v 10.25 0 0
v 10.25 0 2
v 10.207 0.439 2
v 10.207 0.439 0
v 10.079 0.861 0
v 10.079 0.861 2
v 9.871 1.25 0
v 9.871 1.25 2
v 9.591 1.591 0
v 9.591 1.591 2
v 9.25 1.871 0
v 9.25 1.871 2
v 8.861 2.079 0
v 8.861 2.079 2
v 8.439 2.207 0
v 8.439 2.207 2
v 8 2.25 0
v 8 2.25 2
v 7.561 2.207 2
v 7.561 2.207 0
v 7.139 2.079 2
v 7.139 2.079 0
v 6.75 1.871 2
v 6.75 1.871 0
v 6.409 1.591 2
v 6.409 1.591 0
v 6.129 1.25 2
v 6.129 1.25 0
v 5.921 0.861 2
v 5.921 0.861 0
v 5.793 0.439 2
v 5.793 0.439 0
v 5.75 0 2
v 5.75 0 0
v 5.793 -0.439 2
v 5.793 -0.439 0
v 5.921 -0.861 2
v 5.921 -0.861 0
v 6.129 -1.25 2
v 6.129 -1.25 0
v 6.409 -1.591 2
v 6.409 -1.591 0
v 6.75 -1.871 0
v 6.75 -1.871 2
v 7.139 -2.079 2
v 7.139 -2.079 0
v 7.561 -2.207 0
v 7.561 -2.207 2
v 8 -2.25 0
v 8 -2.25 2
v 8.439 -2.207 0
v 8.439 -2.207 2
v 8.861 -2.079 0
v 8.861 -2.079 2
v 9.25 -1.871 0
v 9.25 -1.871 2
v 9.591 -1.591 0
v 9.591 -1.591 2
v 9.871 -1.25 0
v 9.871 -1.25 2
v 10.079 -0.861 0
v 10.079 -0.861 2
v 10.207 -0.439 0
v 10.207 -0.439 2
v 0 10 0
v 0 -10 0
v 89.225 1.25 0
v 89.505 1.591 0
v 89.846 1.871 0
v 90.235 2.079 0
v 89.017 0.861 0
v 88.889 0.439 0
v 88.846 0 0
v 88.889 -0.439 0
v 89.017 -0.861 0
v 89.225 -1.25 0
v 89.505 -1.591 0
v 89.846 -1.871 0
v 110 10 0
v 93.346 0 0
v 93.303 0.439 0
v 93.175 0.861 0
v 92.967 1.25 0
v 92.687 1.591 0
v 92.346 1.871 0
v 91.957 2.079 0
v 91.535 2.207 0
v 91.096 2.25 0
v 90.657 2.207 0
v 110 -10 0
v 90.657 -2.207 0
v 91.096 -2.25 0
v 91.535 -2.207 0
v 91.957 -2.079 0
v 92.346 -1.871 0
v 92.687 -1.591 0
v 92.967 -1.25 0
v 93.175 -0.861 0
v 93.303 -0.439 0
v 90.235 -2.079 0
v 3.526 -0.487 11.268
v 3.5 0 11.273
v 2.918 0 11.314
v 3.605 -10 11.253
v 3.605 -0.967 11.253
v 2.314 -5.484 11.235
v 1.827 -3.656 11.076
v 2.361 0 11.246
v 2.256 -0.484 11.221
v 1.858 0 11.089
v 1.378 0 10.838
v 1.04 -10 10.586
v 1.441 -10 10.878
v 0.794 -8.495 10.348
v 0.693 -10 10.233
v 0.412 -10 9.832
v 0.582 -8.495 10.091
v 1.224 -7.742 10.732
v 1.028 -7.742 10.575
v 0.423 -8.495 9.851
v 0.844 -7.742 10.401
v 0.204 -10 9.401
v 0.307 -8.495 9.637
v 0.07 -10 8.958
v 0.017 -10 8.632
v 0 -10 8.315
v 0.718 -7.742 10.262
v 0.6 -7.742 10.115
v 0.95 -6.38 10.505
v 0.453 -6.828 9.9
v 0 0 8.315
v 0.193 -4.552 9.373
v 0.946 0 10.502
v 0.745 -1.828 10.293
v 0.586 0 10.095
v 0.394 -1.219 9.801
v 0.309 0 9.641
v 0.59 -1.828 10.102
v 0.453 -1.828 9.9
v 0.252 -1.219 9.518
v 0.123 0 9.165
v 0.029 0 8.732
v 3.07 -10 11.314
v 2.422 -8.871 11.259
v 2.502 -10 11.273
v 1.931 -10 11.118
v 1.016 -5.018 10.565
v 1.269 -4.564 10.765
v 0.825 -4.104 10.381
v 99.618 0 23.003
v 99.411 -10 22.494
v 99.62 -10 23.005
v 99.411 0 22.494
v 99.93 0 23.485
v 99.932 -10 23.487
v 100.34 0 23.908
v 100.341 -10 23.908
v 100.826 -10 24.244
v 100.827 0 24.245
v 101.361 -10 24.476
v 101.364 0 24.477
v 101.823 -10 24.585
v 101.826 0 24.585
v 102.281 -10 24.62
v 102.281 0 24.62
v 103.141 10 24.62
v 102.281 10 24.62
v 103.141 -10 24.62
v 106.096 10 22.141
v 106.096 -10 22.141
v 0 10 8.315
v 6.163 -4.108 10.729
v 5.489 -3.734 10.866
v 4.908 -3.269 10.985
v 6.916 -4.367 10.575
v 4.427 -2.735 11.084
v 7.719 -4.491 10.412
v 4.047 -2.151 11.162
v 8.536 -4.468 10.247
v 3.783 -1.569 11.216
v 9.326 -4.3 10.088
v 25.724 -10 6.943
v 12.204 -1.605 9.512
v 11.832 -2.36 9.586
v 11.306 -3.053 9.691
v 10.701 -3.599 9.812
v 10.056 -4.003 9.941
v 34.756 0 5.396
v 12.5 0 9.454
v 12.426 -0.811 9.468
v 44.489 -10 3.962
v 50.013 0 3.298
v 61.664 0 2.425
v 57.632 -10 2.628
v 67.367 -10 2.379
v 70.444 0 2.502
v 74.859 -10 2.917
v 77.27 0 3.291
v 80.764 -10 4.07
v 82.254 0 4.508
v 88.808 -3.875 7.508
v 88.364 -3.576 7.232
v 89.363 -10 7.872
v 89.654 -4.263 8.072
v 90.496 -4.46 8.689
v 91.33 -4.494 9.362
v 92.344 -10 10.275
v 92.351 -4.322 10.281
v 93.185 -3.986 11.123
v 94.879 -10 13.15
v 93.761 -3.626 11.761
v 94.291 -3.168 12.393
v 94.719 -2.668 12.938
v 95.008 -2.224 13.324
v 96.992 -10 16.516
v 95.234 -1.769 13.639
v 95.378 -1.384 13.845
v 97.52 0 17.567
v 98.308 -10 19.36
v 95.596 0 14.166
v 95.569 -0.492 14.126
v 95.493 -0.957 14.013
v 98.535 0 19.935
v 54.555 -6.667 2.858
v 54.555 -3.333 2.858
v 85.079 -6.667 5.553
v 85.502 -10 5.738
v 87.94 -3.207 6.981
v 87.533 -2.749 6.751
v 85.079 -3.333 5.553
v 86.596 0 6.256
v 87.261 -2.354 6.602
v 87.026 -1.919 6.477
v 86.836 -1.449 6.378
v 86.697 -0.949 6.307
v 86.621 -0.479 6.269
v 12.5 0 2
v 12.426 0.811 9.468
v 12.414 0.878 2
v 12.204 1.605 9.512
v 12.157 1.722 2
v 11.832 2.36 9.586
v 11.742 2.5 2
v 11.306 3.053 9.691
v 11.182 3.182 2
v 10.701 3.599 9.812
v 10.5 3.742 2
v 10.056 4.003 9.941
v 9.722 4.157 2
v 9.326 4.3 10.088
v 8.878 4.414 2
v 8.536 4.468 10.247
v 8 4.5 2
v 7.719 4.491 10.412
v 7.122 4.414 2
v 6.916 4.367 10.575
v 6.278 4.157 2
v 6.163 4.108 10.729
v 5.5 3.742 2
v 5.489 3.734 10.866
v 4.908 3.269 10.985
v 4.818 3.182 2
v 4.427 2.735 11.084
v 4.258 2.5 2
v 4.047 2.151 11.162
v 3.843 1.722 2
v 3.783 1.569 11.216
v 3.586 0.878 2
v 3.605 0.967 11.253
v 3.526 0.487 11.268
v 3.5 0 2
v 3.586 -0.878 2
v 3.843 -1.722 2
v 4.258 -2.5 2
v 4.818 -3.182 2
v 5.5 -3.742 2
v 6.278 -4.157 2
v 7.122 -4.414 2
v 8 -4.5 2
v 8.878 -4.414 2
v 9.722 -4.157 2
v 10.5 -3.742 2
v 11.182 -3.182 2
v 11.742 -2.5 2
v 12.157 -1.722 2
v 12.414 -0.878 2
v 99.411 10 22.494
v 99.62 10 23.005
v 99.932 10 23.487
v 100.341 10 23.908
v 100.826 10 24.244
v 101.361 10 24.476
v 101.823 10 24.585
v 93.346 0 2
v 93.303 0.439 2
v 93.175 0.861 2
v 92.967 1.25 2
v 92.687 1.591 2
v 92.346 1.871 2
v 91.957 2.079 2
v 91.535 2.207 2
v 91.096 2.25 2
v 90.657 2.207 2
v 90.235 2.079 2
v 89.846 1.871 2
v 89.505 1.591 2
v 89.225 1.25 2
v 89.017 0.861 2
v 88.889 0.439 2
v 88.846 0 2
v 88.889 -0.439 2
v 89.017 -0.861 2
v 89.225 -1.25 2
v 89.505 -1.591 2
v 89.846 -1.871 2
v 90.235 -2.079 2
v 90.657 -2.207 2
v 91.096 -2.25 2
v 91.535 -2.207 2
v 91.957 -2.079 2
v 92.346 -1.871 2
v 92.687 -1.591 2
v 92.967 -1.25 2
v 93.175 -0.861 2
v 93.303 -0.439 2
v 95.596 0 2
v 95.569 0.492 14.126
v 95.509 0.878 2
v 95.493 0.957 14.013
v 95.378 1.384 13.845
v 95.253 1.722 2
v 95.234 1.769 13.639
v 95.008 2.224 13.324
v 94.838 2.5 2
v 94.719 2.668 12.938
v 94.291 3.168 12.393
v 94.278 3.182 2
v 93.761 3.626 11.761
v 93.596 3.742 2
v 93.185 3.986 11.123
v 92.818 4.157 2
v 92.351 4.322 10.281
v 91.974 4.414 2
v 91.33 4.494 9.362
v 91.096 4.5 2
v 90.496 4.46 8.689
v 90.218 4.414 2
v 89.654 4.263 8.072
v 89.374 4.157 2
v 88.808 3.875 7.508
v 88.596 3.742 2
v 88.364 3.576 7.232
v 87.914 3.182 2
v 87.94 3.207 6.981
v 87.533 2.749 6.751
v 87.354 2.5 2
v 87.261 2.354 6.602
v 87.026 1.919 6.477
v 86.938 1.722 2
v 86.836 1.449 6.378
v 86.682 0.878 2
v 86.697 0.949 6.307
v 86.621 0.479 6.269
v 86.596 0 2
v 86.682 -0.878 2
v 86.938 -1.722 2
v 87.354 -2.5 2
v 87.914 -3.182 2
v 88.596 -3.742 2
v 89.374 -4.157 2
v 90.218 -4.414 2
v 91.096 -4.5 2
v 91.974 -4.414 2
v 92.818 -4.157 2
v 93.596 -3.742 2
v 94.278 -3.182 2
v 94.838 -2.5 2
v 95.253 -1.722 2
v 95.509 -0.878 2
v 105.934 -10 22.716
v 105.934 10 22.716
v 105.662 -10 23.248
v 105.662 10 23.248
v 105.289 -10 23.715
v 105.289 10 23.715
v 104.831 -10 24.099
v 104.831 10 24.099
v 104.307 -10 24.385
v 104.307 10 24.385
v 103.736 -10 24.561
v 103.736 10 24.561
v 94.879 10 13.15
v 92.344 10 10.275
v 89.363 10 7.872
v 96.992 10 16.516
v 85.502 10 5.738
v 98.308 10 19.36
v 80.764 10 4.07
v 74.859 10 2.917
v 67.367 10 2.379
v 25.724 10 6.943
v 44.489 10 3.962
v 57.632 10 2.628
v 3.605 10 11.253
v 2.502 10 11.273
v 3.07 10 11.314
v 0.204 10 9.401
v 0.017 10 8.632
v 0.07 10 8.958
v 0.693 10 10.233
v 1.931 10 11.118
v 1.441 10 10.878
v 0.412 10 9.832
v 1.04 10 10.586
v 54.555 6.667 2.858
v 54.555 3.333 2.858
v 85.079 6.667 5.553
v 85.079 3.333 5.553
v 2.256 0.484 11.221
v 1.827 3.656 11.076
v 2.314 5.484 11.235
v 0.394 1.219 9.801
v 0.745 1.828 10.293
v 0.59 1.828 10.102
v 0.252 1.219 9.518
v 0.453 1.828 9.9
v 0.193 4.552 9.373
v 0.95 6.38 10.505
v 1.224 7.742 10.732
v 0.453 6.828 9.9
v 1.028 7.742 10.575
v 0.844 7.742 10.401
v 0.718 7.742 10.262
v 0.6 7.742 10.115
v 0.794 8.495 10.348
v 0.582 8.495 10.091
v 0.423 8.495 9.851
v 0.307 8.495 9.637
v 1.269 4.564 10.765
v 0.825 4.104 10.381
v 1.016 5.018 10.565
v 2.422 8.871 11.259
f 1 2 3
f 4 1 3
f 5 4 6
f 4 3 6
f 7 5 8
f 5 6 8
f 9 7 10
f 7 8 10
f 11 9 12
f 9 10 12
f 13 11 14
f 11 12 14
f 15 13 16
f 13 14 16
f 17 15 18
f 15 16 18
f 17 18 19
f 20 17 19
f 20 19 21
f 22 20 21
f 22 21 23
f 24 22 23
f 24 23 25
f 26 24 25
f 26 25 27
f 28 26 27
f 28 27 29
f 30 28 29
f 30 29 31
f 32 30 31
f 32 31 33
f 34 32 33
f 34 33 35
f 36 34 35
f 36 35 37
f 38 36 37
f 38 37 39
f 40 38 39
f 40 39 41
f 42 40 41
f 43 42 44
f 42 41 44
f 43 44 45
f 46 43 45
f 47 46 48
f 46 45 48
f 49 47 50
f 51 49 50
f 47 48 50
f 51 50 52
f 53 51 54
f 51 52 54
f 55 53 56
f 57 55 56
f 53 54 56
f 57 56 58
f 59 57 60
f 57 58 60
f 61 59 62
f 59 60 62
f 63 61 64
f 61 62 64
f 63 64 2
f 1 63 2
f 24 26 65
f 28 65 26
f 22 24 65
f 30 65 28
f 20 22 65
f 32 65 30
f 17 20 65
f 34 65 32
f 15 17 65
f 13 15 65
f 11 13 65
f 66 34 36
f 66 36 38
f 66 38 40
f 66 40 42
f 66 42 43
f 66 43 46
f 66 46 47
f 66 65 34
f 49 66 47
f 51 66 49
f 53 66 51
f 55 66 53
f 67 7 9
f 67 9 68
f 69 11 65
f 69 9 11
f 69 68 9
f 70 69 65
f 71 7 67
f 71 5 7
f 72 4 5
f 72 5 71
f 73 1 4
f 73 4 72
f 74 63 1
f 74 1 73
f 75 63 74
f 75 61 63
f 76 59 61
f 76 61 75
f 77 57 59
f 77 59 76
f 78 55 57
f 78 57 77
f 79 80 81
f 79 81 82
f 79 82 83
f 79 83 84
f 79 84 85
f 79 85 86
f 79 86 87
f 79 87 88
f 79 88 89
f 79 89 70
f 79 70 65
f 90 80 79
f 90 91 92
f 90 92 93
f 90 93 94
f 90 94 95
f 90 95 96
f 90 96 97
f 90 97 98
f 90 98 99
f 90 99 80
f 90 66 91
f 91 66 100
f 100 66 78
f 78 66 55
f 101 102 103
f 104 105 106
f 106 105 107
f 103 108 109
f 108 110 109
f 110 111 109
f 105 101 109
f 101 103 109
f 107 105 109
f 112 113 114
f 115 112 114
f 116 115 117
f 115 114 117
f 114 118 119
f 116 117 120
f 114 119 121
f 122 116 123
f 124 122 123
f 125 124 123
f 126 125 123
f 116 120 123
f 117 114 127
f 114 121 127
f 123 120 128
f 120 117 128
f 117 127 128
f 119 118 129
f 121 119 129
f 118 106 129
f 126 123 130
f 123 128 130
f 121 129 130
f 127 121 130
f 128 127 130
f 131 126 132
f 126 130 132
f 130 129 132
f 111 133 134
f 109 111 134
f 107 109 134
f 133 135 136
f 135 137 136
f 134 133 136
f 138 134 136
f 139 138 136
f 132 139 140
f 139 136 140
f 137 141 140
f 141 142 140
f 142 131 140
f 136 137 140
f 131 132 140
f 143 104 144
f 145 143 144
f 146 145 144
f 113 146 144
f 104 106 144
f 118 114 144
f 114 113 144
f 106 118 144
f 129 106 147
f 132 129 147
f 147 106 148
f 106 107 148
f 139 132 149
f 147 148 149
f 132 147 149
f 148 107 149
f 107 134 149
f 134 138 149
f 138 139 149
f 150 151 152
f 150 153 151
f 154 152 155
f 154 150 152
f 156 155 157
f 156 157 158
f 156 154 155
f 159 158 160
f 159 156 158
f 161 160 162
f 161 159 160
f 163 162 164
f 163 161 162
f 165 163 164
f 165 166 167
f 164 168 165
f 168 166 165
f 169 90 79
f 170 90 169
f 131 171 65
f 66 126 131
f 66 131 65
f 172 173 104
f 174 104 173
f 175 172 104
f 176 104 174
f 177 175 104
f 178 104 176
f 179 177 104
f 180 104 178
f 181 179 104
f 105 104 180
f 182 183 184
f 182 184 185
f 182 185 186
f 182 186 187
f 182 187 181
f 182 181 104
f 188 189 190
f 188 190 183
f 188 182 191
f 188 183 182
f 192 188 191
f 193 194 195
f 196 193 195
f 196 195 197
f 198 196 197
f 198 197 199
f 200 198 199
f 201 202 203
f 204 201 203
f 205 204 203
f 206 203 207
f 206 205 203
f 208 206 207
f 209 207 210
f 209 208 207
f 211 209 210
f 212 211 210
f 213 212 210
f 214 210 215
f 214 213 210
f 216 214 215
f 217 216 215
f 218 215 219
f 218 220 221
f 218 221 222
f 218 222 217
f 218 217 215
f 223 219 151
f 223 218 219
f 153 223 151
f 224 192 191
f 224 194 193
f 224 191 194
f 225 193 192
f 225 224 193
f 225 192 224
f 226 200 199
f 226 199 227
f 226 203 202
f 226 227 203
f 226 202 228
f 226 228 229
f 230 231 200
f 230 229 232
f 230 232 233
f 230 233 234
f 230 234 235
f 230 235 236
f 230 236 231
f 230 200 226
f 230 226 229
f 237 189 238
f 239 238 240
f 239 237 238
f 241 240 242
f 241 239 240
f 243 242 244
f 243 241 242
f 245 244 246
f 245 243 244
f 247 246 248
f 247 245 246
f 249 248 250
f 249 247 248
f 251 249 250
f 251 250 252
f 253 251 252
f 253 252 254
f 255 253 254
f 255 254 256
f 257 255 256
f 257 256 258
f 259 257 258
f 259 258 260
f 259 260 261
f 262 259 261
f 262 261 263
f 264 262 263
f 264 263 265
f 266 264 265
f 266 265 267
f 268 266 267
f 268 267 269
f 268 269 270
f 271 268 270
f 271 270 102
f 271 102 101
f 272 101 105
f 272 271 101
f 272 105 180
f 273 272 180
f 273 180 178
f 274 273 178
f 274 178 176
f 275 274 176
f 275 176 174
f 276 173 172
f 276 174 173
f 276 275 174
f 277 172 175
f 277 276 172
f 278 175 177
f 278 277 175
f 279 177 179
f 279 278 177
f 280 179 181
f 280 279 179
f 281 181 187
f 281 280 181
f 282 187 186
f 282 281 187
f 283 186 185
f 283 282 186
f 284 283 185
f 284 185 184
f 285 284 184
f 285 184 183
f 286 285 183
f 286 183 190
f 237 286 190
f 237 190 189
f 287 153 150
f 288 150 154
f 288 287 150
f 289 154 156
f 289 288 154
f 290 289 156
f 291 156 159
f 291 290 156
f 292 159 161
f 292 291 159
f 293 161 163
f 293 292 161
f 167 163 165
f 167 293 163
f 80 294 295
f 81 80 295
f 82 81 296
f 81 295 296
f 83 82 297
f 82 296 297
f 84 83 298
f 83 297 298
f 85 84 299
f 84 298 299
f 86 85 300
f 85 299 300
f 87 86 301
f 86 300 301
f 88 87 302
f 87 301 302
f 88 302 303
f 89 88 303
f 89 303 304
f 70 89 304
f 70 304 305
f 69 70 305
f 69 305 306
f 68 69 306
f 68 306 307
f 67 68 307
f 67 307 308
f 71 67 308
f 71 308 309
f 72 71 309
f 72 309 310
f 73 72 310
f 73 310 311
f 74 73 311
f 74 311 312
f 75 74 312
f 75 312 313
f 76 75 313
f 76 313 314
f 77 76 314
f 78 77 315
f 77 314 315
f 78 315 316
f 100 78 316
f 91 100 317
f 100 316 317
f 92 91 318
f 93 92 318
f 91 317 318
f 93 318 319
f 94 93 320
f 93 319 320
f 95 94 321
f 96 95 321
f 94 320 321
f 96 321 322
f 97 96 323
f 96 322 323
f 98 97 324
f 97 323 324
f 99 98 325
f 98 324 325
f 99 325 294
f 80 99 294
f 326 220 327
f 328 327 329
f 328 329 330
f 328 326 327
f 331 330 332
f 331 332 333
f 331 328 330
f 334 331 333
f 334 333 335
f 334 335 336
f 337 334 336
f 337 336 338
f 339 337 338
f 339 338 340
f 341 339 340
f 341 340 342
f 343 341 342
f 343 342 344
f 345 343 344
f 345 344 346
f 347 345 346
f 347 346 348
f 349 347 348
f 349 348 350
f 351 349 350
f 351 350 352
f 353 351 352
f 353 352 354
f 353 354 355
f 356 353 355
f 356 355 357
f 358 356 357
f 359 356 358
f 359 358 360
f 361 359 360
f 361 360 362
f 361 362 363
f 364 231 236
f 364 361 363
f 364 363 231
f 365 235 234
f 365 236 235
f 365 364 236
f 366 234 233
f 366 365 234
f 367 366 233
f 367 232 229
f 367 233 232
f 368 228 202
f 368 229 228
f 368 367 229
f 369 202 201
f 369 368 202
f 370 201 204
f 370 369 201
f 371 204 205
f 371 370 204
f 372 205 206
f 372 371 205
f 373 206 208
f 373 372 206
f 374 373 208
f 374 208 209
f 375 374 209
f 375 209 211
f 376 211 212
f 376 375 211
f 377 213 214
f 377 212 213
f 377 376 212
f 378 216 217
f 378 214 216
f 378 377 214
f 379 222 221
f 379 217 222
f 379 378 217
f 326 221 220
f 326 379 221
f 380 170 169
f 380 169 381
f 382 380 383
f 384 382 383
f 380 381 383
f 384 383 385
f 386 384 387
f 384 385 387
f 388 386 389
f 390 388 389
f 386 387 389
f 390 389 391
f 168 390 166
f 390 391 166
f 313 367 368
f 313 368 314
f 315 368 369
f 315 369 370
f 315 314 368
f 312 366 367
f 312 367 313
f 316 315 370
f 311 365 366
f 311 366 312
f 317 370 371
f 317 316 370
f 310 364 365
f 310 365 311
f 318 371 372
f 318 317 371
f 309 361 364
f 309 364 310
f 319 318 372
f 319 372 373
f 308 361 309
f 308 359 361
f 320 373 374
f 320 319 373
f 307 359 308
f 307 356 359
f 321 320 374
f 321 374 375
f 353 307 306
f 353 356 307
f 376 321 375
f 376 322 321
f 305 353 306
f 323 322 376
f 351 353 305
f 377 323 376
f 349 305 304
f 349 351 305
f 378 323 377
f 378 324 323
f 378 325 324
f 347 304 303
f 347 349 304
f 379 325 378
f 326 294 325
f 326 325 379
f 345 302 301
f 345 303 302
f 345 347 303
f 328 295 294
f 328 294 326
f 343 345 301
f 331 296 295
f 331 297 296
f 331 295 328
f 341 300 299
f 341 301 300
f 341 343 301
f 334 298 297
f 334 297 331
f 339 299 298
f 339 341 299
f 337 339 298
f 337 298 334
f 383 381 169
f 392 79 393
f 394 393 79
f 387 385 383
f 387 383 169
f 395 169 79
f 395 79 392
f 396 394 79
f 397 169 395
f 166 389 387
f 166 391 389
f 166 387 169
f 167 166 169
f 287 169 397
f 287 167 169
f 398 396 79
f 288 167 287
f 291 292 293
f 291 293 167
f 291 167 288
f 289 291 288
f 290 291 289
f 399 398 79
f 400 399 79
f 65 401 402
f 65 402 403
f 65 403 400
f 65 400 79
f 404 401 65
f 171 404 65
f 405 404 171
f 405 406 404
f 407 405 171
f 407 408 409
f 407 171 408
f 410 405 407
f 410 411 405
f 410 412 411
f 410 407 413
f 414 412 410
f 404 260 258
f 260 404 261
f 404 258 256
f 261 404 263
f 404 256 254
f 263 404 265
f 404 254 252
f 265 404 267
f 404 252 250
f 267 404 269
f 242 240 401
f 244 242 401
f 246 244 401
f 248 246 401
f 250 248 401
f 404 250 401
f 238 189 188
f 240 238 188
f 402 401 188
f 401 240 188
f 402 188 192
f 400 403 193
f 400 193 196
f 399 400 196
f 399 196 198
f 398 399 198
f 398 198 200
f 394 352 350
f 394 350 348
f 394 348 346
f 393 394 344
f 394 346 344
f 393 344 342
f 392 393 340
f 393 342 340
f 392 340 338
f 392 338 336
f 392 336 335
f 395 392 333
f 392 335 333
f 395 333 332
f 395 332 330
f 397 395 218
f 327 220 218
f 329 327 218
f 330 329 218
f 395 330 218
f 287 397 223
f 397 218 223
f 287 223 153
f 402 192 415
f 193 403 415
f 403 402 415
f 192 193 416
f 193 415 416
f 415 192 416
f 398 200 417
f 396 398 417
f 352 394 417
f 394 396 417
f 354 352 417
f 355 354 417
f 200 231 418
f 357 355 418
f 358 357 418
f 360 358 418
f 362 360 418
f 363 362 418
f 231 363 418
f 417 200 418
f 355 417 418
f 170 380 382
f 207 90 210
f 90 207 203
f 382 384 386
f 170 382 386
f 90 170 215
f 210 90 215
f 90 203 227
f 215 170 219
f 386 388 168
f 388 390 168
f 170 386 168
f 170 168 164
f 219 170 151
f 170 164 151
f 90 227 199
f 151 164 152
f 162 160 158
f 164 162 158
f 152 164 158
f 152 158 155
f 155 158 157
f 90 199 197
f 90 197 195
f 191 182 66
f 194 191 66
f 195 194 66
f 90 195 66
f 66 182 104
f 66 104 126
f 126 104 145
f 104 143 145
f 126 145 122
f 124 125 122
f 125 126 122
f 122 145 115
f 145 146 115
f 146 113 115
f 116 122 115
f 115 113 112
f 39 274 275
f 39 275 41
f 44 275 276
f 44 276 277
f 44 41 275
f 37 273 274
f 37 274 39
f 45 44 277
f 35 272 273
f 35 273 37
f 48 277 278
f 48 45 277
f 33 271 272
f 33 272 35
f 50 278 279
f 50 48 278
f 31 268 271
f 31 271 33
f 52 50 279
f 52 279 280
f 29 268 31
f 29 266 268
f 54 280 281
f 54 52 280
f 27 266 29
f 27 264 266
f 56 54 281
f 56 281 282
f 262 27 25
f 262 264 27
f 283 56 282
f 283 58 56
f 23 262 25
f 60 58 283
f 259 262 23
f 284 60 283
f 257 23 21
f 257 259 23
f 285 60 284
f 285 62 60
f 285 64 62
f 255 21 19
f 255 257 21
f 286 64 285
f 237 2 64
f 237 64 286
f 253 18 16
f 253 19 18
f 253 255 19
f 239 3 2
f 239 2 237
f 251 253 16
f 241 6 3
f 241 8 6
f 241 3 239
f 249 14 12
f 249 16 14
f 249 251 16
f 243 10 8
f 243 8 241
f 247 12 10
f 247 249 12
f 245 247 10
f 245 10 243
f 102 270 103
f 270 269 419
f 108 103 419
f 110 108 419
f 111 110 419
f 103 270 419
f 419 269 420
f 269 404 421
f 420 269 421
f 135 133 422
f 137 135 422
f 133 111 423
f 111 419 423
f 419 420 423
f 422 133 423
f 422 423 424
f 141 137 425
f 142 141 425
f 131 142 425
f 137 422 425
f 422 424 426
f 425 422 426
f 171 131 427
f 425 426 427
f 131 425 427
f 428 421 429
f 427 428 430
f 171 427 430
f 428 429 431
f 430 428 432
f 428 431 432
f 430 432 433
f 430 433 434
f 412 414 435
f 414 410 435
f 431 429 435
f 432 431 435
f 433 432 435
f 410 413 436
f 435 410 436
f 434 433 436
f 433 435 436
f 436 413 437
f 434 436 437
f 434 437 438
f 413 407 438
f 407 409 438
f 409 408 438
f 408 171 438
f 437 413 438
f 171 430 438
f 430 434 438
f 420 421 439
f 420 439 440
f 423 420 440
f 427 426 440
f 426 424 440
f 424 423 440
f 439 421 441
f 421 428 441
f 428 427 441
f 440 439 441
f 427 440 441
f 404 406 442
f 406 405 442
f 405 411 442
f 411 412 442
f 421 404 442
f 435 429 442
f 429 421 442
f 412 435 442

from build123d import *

# Parameters (mm, degrees)
F1_DEPTH = 10
F2_R     = 3
F4_R     = 4.5
F5_DEPTH = 22.6211939253
F6_R     = 2.25
F7_DEPTH = 2.0010001


with BuildPart() as f1:
    # F0 (on Front) → F1 (new body, symmetric)
    with BuildSketch(Plane.XZ):
        with BuildLine():
            add(Edge.make_bspline(
                [(0, 12), (66.9550430253, -1.9531170396), (93.0146408351, -3.1716877372), (100, 24.6201938253)],
                knots=[0, 0, 0, 0, 84.8143811399, 84.8143811399, 84.8143811399, 84.8143811399], degree=3))
            Line((0, 12), (0, 0))
            Line((0, 0), (110, 0))
            Line((110, 0), (105.6587955583, 24.6201938253))
            Line((105.6587955583, 24.6201938253), (100, 24.6201938253))
        make_face()
    extrude(amount=F1_DEPTH, both=True)

    # F2
    f2_edges = [f1.edges().sort_by_distance(p)[0] for p in [
        (0, 5, 12),
        (0, -5, 12),
        (100, 5, 24.620194),
        (100, -5, 24.620194),
        (105.658796, 0, 24.620194),
    ]]
    fillet(f2_edges, radius=F2_R)

    # F4 (on offset) → F5 (cut, through all)
    with BuildSketch(Plane.XY.offset(2)):
        with Locations((8, 0)):
            Circle(F4_R)
        with Locations((91.0959199238, 0)):
            Circle(F4_R)
    extrude(amount=F5_DEPTH, mode=Mode.SUBTRACT)

    # F6 (on offset) → F7 (cut, through all)
    with BuildSketch(Plane.XY.offset(2)):
        with Locations((91.0959199238, 0)):
            Circle(F6_R)
        with Locations((8, 0)):
            Circle(F6_R)
    extrude(amount=-F7_DEPTH, mode=Mode.SUBTRACT)


solid = f1.part
